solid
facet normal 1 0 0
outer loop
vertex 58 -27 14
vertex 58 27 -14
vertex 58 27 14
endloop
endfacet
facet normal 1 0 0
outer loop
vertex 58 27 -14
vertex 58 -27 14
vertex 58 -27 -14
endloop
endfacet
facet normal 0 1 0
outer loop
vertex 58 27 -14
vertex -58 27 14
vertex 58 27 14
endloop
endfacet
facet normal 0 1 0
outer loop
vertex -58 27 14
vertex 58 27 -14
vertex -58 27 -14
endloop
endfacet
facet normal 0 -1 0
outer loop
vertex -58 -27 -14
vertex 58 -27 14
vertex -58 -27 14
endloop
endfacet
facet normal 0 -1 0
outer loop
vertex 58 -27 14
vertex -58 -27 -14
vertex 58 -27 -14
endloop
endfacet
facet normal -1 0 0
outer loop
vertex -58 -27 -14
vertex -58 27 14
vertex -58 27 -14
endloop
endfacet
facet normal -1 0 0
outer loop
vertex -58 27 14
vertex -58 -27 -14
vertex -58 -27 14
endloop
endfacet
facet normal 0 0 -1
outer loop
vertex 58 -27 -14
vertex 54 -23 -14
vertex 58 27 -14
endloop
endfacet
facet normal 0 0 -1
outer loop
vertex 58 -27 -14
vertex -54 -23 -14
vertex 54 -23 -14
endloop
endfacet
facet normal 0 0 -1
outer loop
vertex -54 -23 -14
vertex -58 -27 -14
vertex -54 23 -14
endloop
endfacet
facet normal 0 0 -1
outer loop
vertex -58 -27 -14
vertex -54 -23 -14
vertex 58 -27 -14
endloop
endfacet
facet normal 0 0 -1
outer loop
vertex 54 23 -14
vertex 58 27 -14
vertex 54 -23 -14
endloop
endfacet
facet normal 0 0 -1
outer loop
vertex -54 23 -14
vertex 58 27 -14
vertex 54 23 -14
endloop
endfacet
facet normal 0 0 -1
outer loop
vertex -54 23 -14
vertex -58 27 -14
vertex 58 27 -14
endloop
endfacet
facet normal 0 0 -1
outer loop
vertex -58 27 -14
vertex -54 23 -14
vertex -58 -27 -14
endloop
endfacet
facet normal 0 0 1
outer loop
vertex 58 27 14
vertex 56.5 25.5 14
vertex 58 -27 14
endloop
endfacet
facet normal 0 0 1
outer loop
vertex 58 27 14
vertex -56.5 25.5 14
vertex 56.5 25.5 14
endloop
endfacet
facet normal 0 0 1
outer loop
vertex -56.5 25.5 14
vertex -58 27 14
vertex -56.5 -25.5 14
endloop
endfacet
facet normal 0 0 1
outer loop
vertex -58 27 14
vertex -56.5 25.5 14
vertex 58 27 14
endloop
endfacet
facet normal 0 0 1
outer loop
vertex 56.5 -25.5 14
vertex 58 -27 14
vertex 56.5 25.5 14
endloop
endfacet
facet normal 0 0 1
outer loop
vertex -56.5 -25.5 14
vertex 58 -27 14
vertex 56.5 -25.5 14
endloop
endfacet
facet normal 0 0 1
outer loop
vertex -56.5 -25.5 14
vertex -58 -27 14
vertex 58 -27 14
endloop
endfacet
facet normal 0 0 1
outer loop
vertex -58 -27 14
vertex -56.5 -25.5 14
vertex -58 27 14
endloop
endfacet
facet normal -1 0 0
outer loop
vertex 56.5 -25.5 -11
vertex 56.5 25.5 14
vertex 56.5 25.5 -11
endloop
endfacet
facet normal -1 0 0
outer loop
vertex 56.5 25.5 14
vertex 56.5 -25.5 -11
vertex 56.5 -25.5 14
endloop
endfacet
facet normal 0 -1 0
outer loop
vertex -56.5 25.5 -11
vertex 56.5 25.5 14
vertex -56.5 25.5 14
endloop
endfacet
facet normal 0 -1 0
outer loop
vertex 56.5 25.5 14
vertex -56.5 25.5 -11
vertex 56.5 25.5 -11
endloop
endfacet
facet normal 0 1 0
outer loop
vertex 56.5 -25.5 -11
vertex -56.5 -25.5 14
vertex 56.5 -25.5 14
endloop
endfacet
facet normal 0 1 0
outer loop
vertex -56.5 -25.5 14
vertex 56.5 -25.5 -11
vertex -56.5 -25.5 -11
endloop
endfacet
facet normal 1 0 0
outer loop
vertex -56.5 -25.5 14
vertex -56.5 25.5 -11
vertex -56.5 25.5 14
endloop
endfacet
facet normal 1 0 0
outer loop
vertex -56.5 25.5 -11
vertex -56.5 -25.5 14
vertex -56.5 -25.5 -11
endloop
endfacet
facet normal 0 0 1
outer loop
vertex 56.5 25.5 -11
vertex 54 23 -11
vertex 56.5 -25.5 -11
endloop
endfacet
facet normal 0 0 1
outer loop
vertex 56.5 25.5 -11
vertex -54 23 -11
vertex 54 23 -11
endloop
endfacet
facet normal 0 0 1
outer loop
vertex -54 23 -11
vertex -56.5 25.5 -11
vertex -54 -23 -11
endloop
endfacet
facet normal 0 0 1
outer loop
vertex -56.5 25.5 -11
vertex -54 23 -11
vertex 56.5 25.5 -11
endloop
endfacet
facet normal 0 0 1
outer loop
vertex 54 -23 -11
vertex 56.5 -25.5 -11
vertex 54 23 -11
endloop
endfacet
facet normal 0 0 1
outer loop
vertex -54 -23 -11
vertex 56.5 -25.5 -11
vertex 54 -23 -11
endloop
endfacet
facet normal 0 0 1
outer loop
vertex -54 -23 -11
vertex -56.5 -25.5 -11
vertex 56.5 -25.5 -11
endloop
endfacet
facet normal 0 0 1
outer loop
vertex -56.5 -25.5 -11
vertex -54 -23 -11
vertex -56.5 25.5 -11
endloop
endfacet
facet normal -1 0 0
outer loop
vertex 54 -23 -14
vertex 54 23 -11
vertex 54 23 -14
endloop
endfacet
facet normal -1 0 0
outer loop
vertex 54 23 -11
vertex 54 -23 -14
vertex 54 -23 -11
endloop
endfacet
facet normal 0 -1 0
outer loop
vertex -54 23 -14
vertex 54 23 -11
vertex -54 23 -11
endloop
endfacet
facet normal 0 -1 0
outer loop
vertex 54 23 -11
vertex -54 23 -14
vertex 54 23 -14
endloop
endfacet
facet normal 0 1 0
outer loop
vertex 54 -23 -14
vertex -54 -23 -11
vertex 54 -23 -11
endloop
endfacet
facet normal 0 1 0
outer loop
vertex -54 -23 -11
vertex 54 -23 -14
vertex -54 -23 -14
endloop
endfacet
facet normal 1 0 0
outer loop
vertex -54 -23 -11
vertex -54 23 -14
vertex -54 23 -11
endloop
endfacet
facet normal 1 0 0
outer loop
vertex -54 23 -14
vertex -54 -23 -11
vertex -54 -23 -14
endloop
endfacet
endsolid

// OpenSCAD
l=113;
w=25;
h=51;

cutl=70;
cutw=w+5;
cuth=20;

rotate([-90,0,0])
difference(){
    cube([l+3,w+3,h+3],center=true);
    translate([0,-1.5,0])cube([l,w,h],center=true);
    translate([0,1.5,0])cube([l-5,w,h-5],center=true);
    /*
    #union(){
    translate([l/2-cutl/2+1.5-10,0,-((h/2)-(cuth/2)+1.5)])cube([cutl,cutw,cuth],center=true);
    translate([0,-1.5,0])cube([l,w,h],center=true);
    translate([-l/2+15,w/2,-h/2+15])rotate([90,0,0])cylinder(d=8,h=5,$fn=32,center=true);
    }
    /**/
}
